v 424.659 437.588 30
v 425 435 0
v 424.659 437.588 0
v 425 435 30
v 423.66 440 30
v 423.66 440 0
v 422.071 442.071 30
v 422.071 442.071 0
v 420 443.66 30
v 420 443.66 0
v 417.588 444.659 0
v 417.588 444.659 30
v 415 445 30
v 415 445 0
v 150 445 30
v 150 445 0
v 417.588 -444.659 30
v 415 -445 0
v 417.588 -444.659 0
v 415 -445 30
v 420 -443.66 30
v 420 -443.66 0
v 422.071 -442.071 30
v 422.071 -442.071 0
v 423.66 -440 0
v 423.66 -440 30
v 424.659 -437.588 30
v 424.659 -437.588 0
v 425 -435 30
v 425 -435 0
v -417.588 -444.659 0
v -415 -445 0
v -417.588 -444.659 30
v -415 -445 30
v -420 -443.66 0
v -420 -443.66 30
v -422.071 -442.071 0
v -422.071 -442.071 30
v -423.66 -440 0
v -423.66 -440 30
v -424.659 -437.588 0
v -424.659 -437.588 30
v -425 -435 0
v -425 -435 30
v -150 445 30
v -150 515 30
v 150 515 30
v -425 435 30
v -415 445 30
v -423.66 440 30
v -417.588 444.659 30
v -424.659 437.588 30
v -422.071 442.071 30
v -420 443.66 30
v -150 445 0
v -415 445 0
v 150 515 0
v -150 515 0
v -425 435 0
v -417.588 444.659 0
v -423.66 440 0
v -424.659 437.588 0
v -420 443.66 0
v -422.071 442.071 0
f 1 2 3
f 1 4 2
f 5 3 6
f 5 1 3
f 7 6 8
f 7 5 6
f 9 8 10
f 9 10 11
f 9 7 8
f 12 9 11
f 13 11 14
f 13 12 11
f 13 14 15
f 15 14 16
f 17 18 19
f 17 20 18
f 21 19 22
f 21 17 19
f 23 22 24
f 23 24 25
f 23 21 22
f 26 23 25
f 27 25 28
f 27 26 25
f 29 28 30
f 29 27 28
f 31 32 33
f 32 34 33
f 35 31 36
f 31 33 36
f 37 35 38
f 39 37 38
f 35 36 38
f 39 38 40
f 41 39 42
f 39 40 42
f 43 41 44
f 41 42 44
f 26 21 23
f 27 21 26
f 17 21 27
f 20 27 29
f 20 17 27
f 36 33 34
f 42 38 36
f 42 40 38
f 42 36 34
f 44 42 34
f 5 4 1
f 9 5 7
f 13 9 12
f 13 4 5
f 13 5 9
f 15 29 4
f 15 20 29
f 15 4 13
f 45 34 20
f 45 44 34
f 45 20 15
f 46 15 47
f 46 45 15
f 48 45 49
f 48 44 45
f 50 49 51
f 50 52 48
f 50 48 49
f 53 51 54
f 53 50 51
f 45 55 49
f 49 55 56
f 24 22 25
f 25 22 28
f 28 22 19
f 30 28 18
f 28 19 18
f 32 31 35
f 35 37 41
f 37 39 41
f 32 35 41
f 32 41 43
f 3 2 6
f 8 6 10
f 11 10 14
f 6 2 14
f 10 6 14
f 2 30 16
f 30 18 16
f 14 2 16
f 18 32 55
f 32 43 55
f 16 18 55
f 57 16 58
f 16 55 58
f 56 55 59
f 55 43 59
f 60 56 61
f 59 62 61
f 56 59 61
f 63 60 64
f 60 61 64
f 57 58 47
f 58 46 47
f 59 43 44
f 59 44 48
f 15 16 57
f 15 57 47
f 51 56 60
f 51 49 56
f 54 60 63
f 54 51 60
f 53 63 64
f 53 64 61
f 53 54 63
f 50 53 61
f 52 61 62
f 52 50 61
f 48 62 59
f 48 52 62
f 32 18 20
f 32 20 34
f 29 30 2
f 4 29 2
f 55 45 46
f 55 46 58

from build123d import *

# Parameters (mm, degrees)
SKETCH1_W           = 890
SKETCH1_H           = 850
BOSS_EXTRUDE1_DEPTH = 30
FILLET1_R           = 10
BOSS_EXTRUDE3_DEPTH = 70


with BuildPart() as part:
    # Sketch1 → Boss-Extrude1 (new body)
    with BuildSketch(Plane(origin=(0, 0, 0), x_dir=(0, 1, 0), z_dir=(0, 0, 1))):
        Rectangle(SKETCH1_W, SKETCH1_H)
    extrude(amount=BOSS_EXTRUDE1_DEPTH)

    # Fillet1
    fillet1_edges = [part.edges().sort_by_distance(p)[0] for p in [
        (-425, -445, 15),
        (-425, 445, 15),
        (425, 445, 15),
        (425, -445, 15),
    ]]
    fillet(fillet1_edges, radius=FILLET1_R)

    # Sketch3 → Boss-Extrude3 (add)
    with BuildSketch(Plane(origin=(0, 445, 0), x_dir=(-1, 0, 0), z_dir=(0, 1, 0))):
        Polygon((0, 0), (-150, 0), (-150, 30), (150, 30), (150, 0), align=None)
    extrude(amount=BOSS_EXTRUDE3_DEPTH)


solid = part.part
